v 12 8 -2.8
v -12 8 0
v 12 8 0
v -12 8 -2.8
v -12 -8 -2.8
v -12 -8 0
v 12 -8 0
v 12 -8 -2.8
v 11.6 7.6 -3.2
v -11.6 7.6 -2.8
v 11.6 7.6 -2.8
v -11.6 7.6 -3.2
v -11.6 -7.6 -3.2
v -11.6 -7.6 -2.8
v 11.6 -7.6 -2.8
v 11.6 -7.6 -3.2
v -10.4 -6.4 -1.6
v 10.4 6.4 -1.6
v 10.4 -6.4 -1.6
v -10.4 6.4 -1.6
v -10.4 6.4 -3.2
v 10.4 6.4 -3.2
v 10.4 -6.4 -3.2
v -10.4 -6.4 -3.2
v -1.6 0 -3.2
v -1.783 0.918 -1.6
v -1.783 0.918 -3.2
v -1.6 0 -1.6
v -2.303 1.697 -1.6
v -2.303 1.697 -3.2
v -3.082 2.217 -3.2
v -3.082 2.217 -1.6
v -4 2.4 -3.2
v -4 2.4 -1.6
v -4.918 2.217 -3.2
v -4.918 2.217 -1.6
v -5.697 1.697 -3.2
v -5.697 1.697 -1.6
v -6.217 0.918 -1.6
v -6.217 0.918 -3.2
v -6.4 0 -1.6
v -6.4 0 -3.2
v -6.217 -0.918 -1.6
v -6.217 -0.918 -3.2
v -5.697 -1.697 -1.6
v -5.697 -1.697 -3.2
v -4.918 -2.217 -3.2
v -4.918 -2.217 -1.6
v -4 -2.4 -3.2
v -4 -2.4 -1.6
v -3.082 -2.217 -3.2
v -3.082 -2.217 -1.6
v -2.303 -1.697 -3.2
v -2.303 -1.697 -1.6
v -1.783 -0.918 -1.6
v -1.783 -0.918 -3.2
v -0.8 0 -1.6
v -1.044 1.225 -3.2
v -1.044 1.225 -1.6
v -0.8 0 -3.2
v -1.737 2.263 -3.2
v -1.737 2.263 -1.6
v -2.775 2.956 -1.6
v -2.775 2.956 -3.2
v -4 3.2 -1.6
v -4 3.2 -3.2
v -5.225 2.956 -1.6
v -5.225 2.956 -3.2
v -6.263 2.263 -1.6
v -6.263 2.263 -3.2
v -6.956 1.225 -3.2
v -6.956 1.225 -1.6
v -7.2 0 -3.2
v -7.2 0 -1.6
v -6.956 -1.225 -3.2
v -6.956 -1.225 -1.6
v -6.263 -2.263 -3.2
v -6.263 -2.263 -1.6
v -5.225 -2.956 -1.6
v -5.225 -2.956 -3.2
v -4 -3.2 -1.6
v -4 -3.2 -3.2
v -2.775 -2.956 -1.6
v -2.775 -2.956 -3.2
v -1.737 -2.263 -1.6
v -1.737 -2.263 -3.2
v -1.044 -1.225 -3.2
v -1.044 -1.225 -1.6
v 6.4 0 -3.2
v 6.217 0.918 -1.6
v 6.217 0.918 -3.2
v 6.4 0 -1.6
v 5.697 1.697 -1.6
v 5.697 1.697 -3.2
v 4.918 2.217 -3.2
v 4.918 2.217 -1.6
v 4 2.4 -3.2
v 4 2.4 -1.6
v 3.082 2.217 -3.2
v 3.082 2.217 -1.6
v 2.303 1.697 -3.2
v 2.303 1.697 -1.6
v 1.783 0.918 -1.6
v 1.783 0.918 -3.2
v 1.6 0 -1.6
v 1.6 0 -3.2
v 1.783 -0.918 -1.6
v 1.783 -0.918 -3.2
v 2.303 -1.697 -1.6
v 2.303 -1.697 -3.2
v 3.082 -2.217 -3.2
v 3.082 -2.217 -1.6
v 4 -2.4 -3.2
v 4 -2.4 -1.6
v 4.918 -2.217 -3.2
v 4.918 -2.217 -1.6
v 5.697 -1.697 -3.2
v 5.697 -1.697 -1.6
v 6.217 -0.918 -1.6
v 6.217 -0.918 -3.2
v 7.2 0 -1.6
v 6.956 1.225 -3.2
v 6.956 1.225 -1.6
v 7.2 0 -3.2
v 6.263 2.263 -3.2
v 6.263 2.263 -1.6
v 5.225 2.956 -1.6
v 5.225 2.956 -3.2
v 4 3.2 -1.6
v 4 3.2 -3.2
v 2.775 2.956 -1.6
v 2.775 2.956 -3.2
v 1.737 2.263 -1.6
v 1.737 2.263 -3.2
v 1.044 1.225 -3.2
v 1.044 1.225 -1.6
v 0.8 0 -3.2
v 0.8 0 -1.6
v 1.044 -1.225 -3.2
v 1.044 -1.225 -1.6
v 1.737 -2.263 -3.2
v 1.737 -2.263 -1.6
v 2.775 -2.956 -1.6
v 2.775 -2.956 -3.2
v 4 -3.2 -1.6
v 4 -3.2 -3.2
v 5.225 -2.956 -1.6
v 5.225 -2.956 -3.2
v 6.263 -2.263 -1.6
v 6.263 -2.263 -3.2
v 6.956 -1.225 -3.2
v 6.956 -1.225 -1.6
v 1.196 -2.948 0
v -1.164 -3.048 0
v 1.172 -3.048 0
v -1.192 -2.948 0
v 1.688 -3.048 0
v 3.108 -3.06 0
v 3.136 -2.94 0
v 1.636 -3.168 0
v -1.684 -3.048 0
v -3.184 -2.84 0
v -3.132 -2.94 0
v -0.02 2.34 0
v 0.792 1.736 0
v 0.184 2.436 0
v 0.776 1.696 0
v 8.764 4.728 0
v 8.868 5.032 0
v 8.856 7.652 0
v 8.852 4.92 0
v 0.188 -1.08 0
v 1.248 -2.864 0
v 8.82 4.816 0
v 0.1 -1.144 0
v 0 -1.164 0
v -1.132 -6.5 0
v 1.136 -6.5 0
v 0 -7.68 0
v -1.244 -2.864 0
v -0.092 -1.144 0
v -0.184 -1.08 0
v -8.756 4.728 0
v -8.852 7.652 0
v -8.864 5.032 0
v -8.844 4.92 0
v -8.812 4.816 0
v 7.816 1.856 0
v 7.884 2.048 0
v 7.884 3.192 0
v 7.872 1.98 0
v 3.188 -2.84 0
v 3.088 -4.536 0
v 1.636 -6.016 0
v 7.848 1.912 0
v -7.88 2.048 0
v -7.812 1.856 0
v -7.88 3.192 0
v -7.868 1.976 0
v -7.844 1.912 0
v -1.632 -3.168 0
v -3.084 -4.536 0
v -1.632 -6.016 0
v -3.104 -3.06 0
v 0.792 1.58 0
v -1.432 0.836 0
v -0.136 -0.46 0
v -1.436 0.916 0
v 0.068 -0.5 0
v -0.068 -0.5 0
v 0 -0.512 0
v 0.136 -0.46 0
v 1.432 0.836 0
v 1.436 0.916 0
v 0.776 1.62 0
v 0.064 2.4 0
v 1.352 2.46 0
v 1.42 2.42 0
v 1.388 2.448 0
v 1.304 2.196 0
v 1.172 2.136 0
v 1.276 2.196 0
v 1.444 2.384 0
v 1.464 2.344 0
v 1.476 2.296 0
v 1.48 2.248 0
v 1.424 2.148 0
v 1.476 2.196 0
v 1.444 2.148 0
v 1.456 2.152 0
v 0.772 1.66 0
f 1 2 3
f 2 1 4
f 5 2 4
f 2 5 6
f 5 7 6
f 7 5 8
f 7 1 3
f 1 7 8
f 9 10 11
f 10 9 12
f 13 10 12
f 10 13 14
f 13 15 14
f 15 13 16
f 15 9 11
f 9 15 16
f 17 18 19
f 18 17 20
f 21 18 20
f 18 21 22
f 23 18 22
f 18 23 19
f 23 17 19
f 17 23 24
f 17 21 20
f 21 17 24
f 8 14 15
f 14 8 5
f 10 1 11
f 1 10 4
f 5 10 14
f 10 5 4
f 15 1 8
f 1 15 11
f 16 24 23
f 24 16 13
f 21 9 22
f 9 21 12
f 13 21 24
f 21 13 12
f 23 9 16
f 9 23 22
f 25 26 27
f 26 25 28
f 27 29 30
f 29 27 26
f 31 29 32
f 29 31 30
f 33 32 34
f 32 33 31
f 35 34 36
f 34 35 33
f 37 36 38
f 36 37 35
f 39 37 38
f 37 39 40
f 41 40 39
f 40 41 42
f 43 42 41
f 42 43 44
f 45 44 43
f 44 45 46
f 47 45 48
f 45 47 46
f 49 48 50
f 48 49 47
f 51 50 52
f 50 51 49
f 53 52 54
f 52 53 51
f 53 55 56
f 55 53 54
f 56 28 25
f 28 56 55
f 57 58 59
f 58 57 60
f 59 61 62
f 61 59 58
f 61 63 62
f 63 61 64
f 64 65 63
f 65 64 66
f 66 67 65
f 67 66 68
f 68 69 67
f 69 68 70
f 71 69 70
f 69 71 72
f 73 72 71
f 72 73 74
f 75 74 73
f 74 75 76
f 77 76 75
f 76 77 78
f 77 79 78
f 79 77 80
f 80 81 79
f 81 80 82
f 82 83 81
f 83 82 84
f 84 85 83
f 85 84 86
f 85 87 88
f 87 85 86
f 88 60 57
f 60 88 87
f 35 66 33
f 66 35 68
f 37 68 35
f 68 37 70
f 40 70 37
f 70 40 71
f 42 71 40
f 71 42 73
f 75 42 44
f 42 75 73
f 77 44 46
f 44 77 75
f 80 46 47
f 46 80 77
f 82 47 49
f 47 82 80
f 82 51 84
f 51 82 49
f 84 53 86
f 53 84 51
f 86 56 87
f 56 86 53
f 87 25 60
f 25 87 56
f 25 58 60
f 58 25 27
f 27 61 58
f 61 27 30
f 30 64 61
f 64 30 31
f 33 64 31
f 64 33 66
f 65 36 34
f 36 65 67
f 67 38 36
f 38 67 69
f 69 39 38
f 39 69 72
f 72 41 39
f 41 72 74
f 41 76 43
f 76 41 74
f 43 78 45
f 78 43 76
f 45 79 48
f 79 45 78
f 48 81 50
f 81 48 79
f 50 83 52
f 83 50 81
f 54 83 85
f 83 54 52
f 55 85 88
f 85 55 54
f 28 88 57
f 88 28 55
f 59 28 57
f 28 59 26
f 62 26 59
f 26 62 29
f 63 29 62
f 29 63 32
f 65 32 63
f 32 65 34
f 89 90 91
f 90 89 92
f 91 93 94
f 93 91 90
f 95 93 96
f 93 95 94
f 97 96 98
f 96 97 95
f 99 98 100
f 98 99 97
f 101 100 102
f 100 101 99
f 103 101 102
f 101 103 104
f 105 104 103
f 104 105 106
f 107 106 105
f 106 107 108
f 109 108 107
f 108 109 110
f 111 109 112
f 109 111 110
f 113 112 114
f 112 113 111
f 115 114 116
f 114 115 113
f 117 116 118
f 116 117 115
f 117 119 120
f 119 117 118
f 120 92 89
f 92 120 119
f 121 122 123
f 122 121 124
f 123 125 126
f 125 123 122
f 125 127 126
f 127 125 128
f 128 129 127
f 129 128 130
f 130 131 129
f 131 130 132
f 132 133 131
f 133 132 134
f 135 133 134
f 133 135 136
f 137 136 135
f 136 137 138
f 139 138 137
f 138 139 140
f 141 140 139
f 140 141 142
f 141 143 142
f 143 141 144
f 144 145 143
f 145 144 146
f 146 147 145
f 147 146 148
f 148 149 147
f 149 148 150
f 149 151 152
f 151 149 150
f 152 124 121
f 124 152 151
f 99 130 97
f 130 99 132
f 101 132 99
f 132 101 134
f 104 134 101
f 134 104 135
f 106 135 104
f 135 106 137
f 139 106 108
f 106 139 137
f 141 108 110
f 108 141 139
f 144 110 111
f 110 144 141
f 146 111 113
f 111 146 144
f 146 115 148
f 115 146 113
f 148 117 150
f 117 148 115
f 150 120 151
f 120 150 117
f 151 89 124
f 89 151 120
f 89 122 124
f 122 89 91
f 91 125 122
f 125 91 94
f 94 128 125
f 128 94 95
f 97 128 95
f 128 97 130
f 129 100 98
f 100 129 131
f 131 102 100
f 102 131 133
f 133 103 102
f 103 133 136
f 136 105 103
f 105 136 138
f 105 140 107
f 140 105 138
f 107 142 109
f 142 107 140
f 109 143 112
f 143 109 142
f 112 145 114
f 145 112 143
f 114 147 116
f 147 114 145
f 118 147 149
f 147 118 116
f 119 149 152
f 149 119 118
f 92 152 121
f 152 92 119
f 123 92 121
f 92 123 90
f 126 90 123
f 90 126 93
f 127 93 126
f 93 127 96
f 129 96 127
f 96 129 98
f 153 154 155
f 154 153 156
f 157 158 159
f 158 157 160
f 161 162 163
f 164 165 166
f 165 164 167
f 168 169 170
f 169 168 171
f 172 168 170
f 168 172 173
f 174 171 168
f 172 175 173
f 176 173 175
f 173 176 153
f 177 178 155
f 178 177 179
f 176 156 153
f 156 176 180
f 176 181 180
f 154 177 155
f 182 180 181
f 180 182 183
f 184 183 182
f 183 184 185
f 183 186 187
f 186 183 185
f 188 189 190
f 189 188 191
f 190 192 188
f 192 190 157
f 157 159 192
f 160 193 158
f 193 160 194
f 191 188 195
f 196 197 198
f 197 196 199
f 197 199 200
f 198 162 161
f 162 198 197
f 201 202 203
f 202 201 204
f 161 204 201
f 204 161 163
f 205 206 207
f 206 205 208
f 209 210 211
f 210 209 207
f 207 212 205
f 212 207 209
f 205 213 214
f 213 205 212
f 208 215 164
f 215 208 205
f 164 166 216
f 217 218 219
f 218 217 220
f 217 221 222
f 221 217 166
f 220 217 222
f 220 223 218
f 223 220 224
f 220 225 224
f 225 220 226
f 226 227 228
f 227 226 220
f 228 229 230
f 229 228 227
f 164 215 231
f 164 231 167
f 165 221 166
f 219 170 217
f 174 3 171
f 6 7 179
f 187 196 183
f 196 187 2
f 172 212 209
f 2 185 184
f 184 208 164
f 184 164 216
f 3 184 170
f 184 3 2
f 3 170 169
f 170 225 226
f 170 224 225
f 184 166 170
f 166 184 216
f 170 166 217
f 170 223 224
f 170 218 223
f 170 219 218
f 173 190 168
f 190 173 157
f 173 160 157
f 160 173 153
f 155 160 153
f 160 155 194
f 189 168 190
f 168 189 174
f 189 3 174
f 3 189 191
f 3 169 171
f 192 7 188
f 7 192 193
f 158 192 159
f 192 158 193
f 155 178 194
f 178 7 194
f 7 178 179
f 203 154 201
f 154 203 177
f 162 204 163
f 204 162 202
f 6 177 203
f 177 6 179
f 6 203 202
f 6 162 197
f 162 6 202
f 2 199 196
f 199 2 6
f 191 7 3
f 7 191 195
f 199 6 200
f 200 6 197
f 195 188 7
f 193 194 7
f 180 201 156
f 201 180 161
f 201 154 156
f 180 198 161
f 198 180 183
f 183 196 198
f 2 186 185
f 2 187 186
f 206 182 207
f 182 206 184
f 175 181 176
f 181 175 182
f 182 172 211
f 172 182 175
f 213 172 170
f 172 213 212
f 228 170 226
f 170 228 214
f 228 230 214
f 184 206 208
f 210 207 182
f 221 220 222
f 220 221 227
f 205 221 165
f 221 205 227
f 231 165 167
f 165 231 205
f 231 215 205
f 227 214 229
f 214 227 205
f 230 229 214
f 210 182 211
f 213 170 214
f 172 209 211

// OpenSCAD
// file: ../p/4-4ring3.scad
use <../lib.scad>
$fa=1; $fs=0.2;
function ldraw_lib__4_4ring3(realsolid=false) = [
// 0 Ring  3 x 1.0
// 0 Name: 4-4ring3.dat
// 0 Author: James Jessiman
// 0 !LDRAW_ORG Primitive UPDATE 2009-01
// 0 !LICENSE Licensed under CC BY 2.0 and CC BY 4.0 : see CAreadme.txt
// 
// 0 BFC CERTIFY CCW
  [0,"BFC","CERTIFY"],
  [0,"BFC","CCW"],
// 
// 0 !HISTORY 1998-12-15 [PTadmin] Official Update 1998-10
// 0 !HISTORY 2002-04-05 [hafhead] Added BFC statement
// 0 !HISTORY 2002-04-25 [PTadmin] Official Update 2002-02
// 0 !HISTORY 2007-06-24 [PTadmin] Header formatted for Contributor Agreement
// 0 !HISTORY 2008-07-01 [PTadmin] Official Update 2008-01
// 0 !HISTORY 2008-08-26 [cwdee] Switch polygon winding and rename
// 0 !HISTORY 2009-05-02 [PTadmin] Official Update 2009-01
// 
// 
// 4 16 -1.5308 0 3.6956 -1.1481 0 2.7717 0 0 3 0 0 4
  [4,16,-1.5308,0,3.6956,-1.1481,0,2.7717,0,0,3,0,0,4],
// 4 16 -2.8284 0 2.8284 -2.1213 0 2.1213 -1.1481 0 2.7717 -1.5308 0 3.6956
  [4,16,-2.8284,0,2.8284,-2.1213,0,2.1213,-1.1481,0,2.7717,-1.5308,0,3.6956],
// 4 16 -3.6956 0 1.5308 -2.7717 0 1.1481 -2.1213 0 2.1213 -2.8284 0 2.8284
  [4,16,-3.6956,0,1.5308,-2.7717,0,1.1481,-2.1213,0,2.1213,-2.8284,0,2.8284],
// 4 16 -4 0 0 -3 0 0 -2.7717 0 1.1481 -3.6956 0 1.5308
  [4,16,-4,0,0,-3,0,0,-2.7717,0,1.1481,-3.6956,0,1.5308],
// 4 16 -3.6956 0 -1.5308 -2.7717 0 -1.1481 -3 0 0 -4 0 0
  [4,16,-3.6956,0,-1.5308,-2.7717,0,-1.1481,-3,0,0,-4,0,0],
// 4 16 -2.8284 0 -2.8284 -2.1213 0 -2.1213 -2.7717 0 -1.1481 -3.6956 0 -1.5308
  [4,16,-2.8284,0,-2.8284,-2.1213,0,-2.1213,-2.7717,0,-1.1481,-3.6956,0,-1.5308],
// 4 16 -1.5308 0 -3.6956 -1.1481 0 -2.7717 -2.1213 0 -2.1213 -2.8284 0 -2.8284
  [4,16,-1.5308,0,-3.6956,-1.1481,0,-2.7717,-2.1213,0,-2.1213,-2.8284,0,-2.8284],
// 4 16 0 0 -4 0 0 -3 -1.1481 0 -2.7717 -1.5308 0 -3.6956
  [4,16,0,0,-4,0,0,-3,-1.1481,0,-2.7717,-1.5308,0,-3.6956],
// 4 16 1.5308 0 -3.6956 1.1481 0 -2.7717 0 0 -3 0 0 -4
  [4,16,1.5308,0,-3.6956,1.1481,0,-2.7717,0,0,-3,0,0,-4],
// 4 16 2.8284 0 -2.8284 2.1213 0 -2.1213 1.1481 0 -2.7717 1.5308 0 -3.6956
  [4,16,2.8284,0,-2.8284,2.1213,0,-2.1213,1.1481,0,-2.7717,1.5308,0,-3.6956],
// 4 16 3.6956 0 -1.5308 2.7717 0 -1.1481 2.1213 0 -2.1213 2.8284 0 -2.8284
  [4,16,3.6956,0,-1.5308,2.7717,0,-1.1481,2.1213,0,-2.1213,2.8284,0,-2.8284],
// 4 16 4 0 0 3 0 0 2.7717 0 -1.1481 3.6956 0 -1.5308
  [4,16,4,0,0,3,0,0,2.7717,0,-1.1481,3.6956,0,-1.5308],
// 4 16 3.6956 0 1.5308 2.7717 0 1.1481 3 0 0 4 0 0
  [4,16,3.6956,0,1.5308,2.7717,0,1.1481,3,0,0,4,0,0],
// 4 16 2.8284 0 2.8284 2.1213 0 2.1213 2.7717 0 1.1481 3.6956 0 1.5308
  [4,16,2.8284,0,2.8284,2.1213,0,2.1213,2.7717,0,1.1481,3.6956,0,1.5308],
// 4 16 1.5308 0 3.6956 1.1481 0 2.7717 2.1213 0 2.1213 2.8284 0 2.8284
  [4,16,1.5308,0,3.6956,1.1481,0,2.7717,2.1213,0,2.1213,2.8284,0,2.8284],
// 4 16 0 0 4 0 0 3 1.1481 0 2.7717 1.5308 0 3.6956
  [4,16,0,0,4,0,0,3,1.1481,0,2.7717,1.5308,0,3.6956],
// 0
];
module ldraw_lib__4_4ring3(step=0, col=false, unit=2/5, alt=false, line=0.2, solid=!$preview)
    makepoly(ldraw_lib__4_4ring3(solid), step=step, col=col, unit=unit, alt=alt, line=line, solid=solid);
ldraw_lib__4_4ring3(line=0.2);
// file: ../p/4-4edge.scad
use <../lib.scad>
function ldraw_lib__4_4edge() = [
// 0 Circle 1.0
// 0 Name: 4-4edge.dat
// 0 Author: James Jessiman
// 0 !LDRAW_ORG Primitive UPDATE 2017-01
// 0 !LICENSE Licensed under CC BY 2.0 and CC BY 4.0 : see CAreadme.txt
// 
// 0 BFC CERTIFY CCW
  [0,"BFC","CERTIFY"],
  [0,"BFC","CCW"],
// 
// 0 !HISTORY 1998-12-15 [PTadmin] Official Update 1998-10
// 0 !HISTORY 2005-12-28 [PTadmin] Official Update 2005-01
// 0 !HISTORY 2007-06-24 [PTadmin] Header formatted for Contributor Agreement
// 0 !HISTORY 2008-07-01 [PTadmin] Official Update 2008-01
// 0 !HISTORY 2017-01-15 [Steffen] BFCed
// 0 !HISTORY 2017-12-30 [PTadmin] Official Update 2017-01
// 
// 
// 2 24 1 0 0 0.9239 0 0.3827
  [2,24,1,0,0,0.9239,0,0.3827],
// 2 24 0.9239 0 0.3827 0.7071 0 0.7071
  [2,24,0.9239,0,0.3827,0.7071,0,0.7071],
// 2 24 0.7071 0 0.7071 0.3827 0 0.9239
  [2,24,0.7071,0,0.7071,0.3827,0,0.9239],
// 2 24 0.3827 0 0.9239 0 0 1
  [2,24,0.3827,0,0.9239,0,0,1],
// 2 24 0 0 1 -0.3827 0 0.9239
  [2,24,0,0,1,-0.3827,0,0.9239],
// 2 24 -0.3827 0 0.9239 -0.7071 0 0.7071
  [2,24,-0.3827,0,0.9239,-0.7071,0,0.7071],
// 2 24 -0.7071 0 0.7071 -0.9239 0 0.3827
  [2,24,-0.7071,0,0.7071,-0.9239,0,0.3827],
// 2 24 -0.9239 0 0.3827 -1 0 -0
  [2,24,-0.9239,0,0.3827,-1,0,-0],
// 2 24 -1 0 -0 -0.9239 0 -0.3827
  [2,24,-1,0,-0,-0.9239,0,-0.3827],
// 2 24 -0.9239 0 -0.3827 -0.7071 0 -0.7071
  [2,24,-0.9239,0,-0.3827,-0.7071,0,-0.7071],
// 2 24 -0.7071 0 -0.7071 -0.3827 0 -0.9239
  [2,24,-0.7071,0,-0.7071,-0.3827,0,-0.9239],
// 2 24 -0.3827 0 -0.9239 0 0 -1
  [2,24,-0.3827,0,-0.9239,0,0,-1],
// 2 24 0 0 -1 0.3827 0 -0.9239
  [2,24,0,0,-1,0.3827,0,-0.9239],
// 2 24 0.3827 0 -0.9239 0.7071 0 -0.7071
  [2,24,0.3827,0,-0.9239,0.7071,0,-0.7071],
// 2 24 0.7071 0 -0.7071 0.9239 0 -0.3827
  [2,24,0.7071,0,-0.7071,0.9239,0,-0.3827],
// 2 24 0.9239 0 -0.3827 1 0 0
  [2,24,0.9239,0,-0.3827,1,0,0],
];
module ldraw_lib__4_4edge(step=0, col=false, unit=2/5, alt=false, line=0.2, solid=!$preview)
    makepoly(ldraw_lib__4_4edge(), step=step, col=col, unit=unit, alt=alt, line=line, solid=solid);
ldraw_lib__4_4edge(line=0.2);
// file: ../p/4-4cyli.scad
use <../lib.scad>
$fa=1; $fs=0.2;
function ldraw_lib__4_4cyli(realsolid=false) = [
// 0 Cylinder 1.0
// 0 Name: 4-4cyli.dat
// 0 Author: James Jessiman
// 0 !LDRAW_ORG Primitive UPDATE 2005-01
// 0 !LICENSE Licensed under CC BY 2.0 and CC BY 4.0 : see CAreadme.txt
// 
// 0 BFC CERTIFY CCW
  [0,"BFC","CERTIFY"],
  [0,"BFC","CCW"],
// 
// 0 !HISTORY 1998-12-15 [PTadmin] Official Update 1998-10
// 0 !HISTORY 2002-03-23 [sbliss] Added BFC statement; merged headers from files in distributions LDraw 0.27 and Complete.
// 0 !HISTORY 2002-04-25 [PTadmin] Official Update 2002-02
// 0 !HISTORY 2004-12-14 [guyvivan] BFC CCW
// 0 !HISTORY 2005-12-28 [PTadmin] Official Update 2005-01
// 0 !HISTORY 2007-06-24 [PTadmin] Header formatted for Contributor Agreement
// 0 !HISTORY 2008-07-01 [PTadmin] Official Update 2008-01
// 
// 
// 4 16 1 1 0 0.9239 1 0.3827 0.9239 0 0.3827 1 0 0
  [4,16,1,1,0,0.9239,1,0.3827,0.9239,0,0.3827,1,0,0],
// 5 24 1 0 0 1 1 0 0.9239 0 0.3827 0.9239 0 -0.3827
  [5,24,1,0,0,1,1,0,0.9239,0,0.3827,0.9239,0,-0.3827],
// 4 16 0.9239 1 0.3827 0.7071 1 0.7071 0.7071 0 0.7071 0.9239 0 0.3827
  [4,16,0.9239,1,0.3827,0.7071,1,0.7071,0.7071,0,0.7071,0.9239,0,0.3827],
// 5 24 0.9239 0 0.3827 0.9239 1 0.3827 0.7071 0 0.7071 1 0 0
  [5,24,0.9239,0,0.3827,0.9239,1,0.3827,0.7071,0,0.7071,1,0,0],
// 4 16 0.7071 1 0.7071 0.3827 1 0.9239 0.3827 0 0.9239 0.7071 0 0.7071
  [4,16,0.7071,1,0.7071,0.3827,1,0.9239,0.3827,0,0.9239,0.7071,0,0.7071],
// 5 24 0.7071 0 0.7071 0.7071 1 0.7071 0.3827 0 0.9239 0.9239 0 0.3827
  [5,24,0.7071,0,0.7071,0.7071,1,0.7071,0.3827,0,0.9239,0.9239,0,0.3827],
// 4 16 0.3827 1 0.9239 0 1 1 0 0 1 0.3827 0 0.9239
  [4,16,0.3827,1,0.9239,0,1,1,0,0,1,0.3827,0,0.9239],
// 5 24 0.3827 0 0.9239 0.3827 1 0.9239 0 0 1 0.7071 0 0.7071
  [5,24,0.3827,0,0.9239,0.3827,1,0.9239,0,0,1,0.7071,0,0.7071],
// 4 16 0 1 1 -0.3827 1 0.9239 -0.3827 0 0.9239 0 0 1
  [4,16,0,1,1,-0.3827,1,0.9239,-0.3827,0,0.9239,0,0,1],
// 5 24 0 0 1 0 1 1 -0.3827 0 0.9239 0.3827 0 0.9239
  [5,24,0,0,1,0,1,1,-0.3827,0,0.9239,0.3827,0,0.9239],
// 4 16 -0.3827 1 0.9239 -0.7071 1 0.7071 -0.7071 0 0.7071 -0.3827 0 0.9239
  [4,16,-0.3827,1,0.9239,-0.7071,1,0.7071,-0.7071,0,0.7071,-0.3827,0,0.9239],
// 5 24 -0.3827 0 0.9239 -0.3827 1 0.9239 -0.7071 0 0.7071 0 0 1
  [5,24,-0.3827,0,0.9239,-0.3827,1,0.9239,-0.7071,0,0.7071,0,0,1],
// 4 16 -0.7071 1 0.7071 -0.9239 1 0.3827 -0.9239 0 0.3827 -0.7071 0 0.7071
  [4,16,-0.7071,1,0.7071,-0.9239,1,0.3827,-0.9239,0,0.3827,-0.7071,0,0.7071],
// 5 24 -0.7071 0 0.7071 -0.7071 1 0.7071 -0.9239 0 0.3827 -0.3827 0 0.9239
  [5,24,-0.7071,0,0.7071,-0.7071,1,0.7071,-0.9239,0,0.3827,-0.3827,0,0.9239],
// 4 16 -0.9239 1 0.3827 -1 1 0 -1 0 0 -0.9239 0 0.3827
  [4,16,-0.9239,1,0.3827,-1,1,0,-1,0,0,-0.9239,0,0.3827],
// 5 24 -0.9239 0 0.3827 -0.9239 1 0.3827 -1 0 0 -0.7071 0 0.7071
  [5,24,-0.9239,0,0.3827,-0.9239,1,0.3827,-1,0,0,-0.7071,0,0.7071],
// 4 16 -1 1 0 -0.9239 1 -0.3827 -0.9239 0 -0.3827 -1 0 0
  [4,16,-1,1,0,-0.9239,1,-0.3827,-0.9239,0,-0.3827,-1,0,0],
// 5 24 -1 0 0 -1 1 0 -0.9239 0 -0.3827 -0.9239 0 0.3827
  [5,24,-1,0,0,-1,1,0,-0.9239,0,-0.3827,-0.9239,0,0.3827],
// 4 16 -0.9239 1 -0.3827 -0.7071 1 -0.7071 -0.7071 0 -0.7071 -0.9239 0 -0.3827
  [4,16,-0.9239,1,-0.3827,-0.7071,1,-0.7071,-0.7071,0,-0.7071,-0.9239,0,-0.3827],
// 5 24 -0.9239 0 -0.3827 -0.9239 1 -0.3827 -0.7071 0 -0.7071 -1 0 0
  [5,24,-0.9239,0,-0.3827,-0.9239,1,-0.3827,-0.7071,0,-0.7071,-1,0,0],
// 4 16 -0.7071 1 -0.7071 -0.3827 1 -0.9239 -0.3827 0 -0.9239 -0.7071 0 -0.7071
  [4,16,-0.7071,1,-0.7071,-0.3827,1,-0.9239,-0.3827,0,-0.9239,-0.7071,0,-0.7071],
// 5 24 -0.7071 0 -0.7071 -0.7071 1 -0.7071 -0.3827 0 -0.9239 -0.9239 0 -0.3827
  [5,24,-0.7071,0,-0.7071,-0.7071,1,-0.7071,-0.3827,0,-0.9239,-0.9239,0,-0.3827],
// 4 16 -0.3827 1 -0.9239 0 1 -1 0 0 -1 -0.3827 0 -0.9239
  [4,16,-0.3827,1,-0.9239,0,1,-1,0,0,-1,-0.3827,0,-0.9239],
// 5 24 -0.3827 0 -0.9239 -0.3827 1 -0.9239 0 0 -1 -0.7071 0 -0.7071
  [5,24,-0.3827,0,-0.9239,-0.3827,1,-0.9239,0,0,-1,-0.7071,0,-0.7071],
// 4 16 0 1 -1 0.3827 1 -0.9239 0.3827 0 -0.9239 0 0 -1
  [4,16,0,1,-1,0.3827,1,-0.9239,0.3827,0,-0.9239,0,0,-1],
// 5 24 0 0 -1 0 1 -1 0.3827 0 -0.9239 -0.3827 0 -0.9239
  [5,24,0,0,-1,0,1,-1,0.3827,0,-0.9239,-0.3827,0,-0.9239],
// 4 16 0.3827 1 -0.9239 0.7071 1 -0.7071 0.7071 0 -0.7071 0.3827 0 -0.9239
  [4,16,0.3827,1,-0.9239,0.7071,1,-0.7071,0.7071,0,-0.7071,0.3827,0,-0.9239],
// 5 24 0.3827 0 -0.9239 0.3827 1 -0.9239 0.7071 0 -0.7071 0 0 -1
  [5,24,0.3827,0,-0.9239,0.3827,1,-0.9239,0.7071,0,-0.7071,0,0,-1],
// 4 16 0.7071 1 -0.7071 0.9239 1 -0.3827 0.9239 0 -0.3827 0.7071 0 -0.7071
  [4,16,0.7071,1,-0.7071,0.9239,1,-0.3827,0.9239,0,-0.3827,0.7071,0,-0.7071],
// 5 24 0.7071 0 -0.7071 0.7071 1 -0.7071 0.9239 0 -0.3827 0.3827 0 -0.9239
  [5,24,0.7071,0,-0.7071,0.7071,1,-0.7071,0.9239,0,-0.3827,0.3827,0,-0.9239],
// 4 16 0.9239 1 -0.3827 1 1 0 1 0 0 0.9239 0 -0.3827
  [4,16,0.9239,1,-0.3827,1,1,0,1,0,0,0.9239,0,-0.3827],
// 5 24 0.9239 0 -0.3827 0.9239 1 -0.3827 1 0 0 0.7071 0 -0.7071
  [5,24,0.9239,0,-0.3827,0.9239,1,-0.3827,1,0,0,0.7071,0,-0.7071],
// 0
];
module ldraw_lib__4_4cyli(step=0, col=false, unit=2/5, alt=false, line=0.2, solid=!$preview)
    makepoly(ldraw_lib__4_4cyli(solid), step=step, col=col, unit=unit, alt=alt, line=line, solid=solid);
ldraw_lib__4_4cyli(line=0.2);
// file: ../p/stud4.scad
use <../lib.scad>
use <4-4cyli.scad>
use <4-4edge.scad>
use <4-4ring3.scad>
function ldraw_lib__stud4() = [
// 0 Stud Tube Open
// 0 Name: stud4.dat
// 0 Author: James Jessiman
// 0 !LDRAW_ORG Primitive UPDATE 2009-02
// 0 !LICENSE Licensed under CC BY 4.0 : see CAreadme.txt
// 
// 0 BFC CERTIFY CCW
  [0,"BFC","CERTIFY"],
  [0,"BFC","CCW"],
// 
// 0 !HISTORY 1999-07-05 [PTadmin] Official Update 1999-05
// 0 !HISTORY 2002-04-04 [sbliss] Modified for BFC compliance
// 0 !HISTORY 2002-04-25 [PTadmin] Official Update 2002-02
// 0 !HISTORY 2007-06-24 [PTadmin] Header formatted for Contributor Agreement
// 0 !HISTORY 2008-07-01 [PTadmin] Official Update 2008-01
// 0 !HISTORY 2009-06-21 [cwdee] Update ring references to 4-4ring
// 0 !HISTORY 2009-09-03 [PTadmin] Official Update 2009-02
// 
// 
// 1 16 0 -4 0 6 0 0 0 1 0 0 0 6 4-4edge.dat
  [1,16,0,-4,0,6,0,0,0,1,0,0,0,6, ldraw_lib__4_4edge()],
// 1 16 0 -4 0 8 0 0 0 1 0 0 0 8 4-4edge.dat
  [1,16,0,-4,0,8,0,0,0,1,0,0,0,8, ldraw_lib__4_4edge()],
// 1 16 0 0 0 6 0 0 0 1 0 0 0 6 4-4edge.dat
  [1,16,0,0,0,6,0,0,0,1,0,0,0,6, ldraw_lib__4_4edge()],
// 1 16 0 0 0 8 0 0 0 1 0 0 0 8 4-4edge.dat
  [1,16,0,0,0,8,0,0,0,1,0,0,0,8, ldraw_lib__4_4edge()],
// 0 BFC INVERTNEXT
  [0,"BFC","INVERTNEXT"],
// 1 16 0 -4 0 6 0 0 0 4 0 0 0 6 4-4cyli.dat
  [1,16,0,-4,0,6,0,0,0,4,0,0,0,6, ldraw_lib__4_4cyli()],
// 1 16 0 -4 0 8 0 0 0 4 0 0 0 8 4-4cyli.dat
  [1,16,0,-4,0,8,0,0,0,4,0,0,0,8, ldraw_lib__4_4cyli()],
// 1 16 0 -4 0 2 0 0 0 1 0 0 0 2 4-4ring3.dat
  [1,16,0,-4,0,2,0,0,0,1,0,0,0,2, ldraw_lib__4_4ring3()],
  [-1,16,0,0,0,2,0,0,0,-1,0,0,0,2, ldraw_lib__4_4ring3()],
// 0
];
module ldraw_lib__stud4(step=0, col=false, unit=2/5, alt=false, line=0.2, solid=!$preview)
    makepoly(ldraw_lib__stud4(), step=step, col=col, unit=unit, alt=alt, line=line, solid=solid);
ldraw_lib__stud4(line=0.2);
// file: ../p/stug4-1x2.scad
use <../lib.scad>
use <stud4.scad>
$fa=1; $fs=0.2;
function ldraw_lib__stug4_1x2(realsolid=false) = [
// 0 Stud Tube Open Group  1 x  2
// 0 Name: stug4-1x2.dat
// 0 Author: Steffen [Steffen]
// 0 !LDRAW_ORG Primitive UPDATE 2011-01
// 0 !LICENSE Licensed under CC BY 2.0 and CC BY 4.0 : see CAreadme.txt
// 
// 0 BFC CERTIFY CCW
  [0,"BFC","CERTIFY"],
  [0,"BFC","CCW"],
// 
// 0 !HISTORY 2011-07-25 [PTadmin] Official Update 2011-01
// 
// 
// 1 16 -10 0 0 1 0 0 0 1 0 0 0 1 stud4.dat
  [1,16,-10,0,0,1,0,0,0,1,0,0,0,1, ldraw_lib__stud4(realsolid)],
// 1 16 10 0 0 1 0 0 0 1 0 0 0 1 stud4.dat
  [1,16,10,0,0,1,0,0,0,1,0,0,0,1, ldraw_lib__stud4(realsolid)],
];
module ldraw_lib__stug4_1x2(step=0, col=false, unit=2/5, alt=false, line=0.2, solid=!$preview)
    makepoly(ldraw_lib__stug4_1x2(solid), step=step, col=col, unit=unit, alt=alt, line=line, solid=solid);
ldraw_lib__stug4_1x2(line=0.2);
// file: ../p/box5.scad
use <../lib.scad>
function ldraw_lib__box5() = [
// 0 Box with 5 Faces and All Edges
// 0 Name: box5.dat
// 0 Author: James Jessiman
// 0 !LDRAW_ORG Primitive UPDATE 2012-01
// 0 !LICENSE Licensed under CC BY 2.0 and CC BY 4.0 : see CAreadme.txt
// 
// 0 BFC CERTIFY CCW
  [0,"BFC","CERTIFY"],
  [0,"BFC","CCW"],
// 
// 0 !HISTORY 2002-04-03 [sbliss] Modified for BFC compliance
// 0 !HISTORY 2002-04-25 [PTadmin] Official Update 2002-02
// 0 !HISTORY 2007-06-24 [PTadmin] Header formatted for Contributor Agreement
// 0 !HISTORY 2008-07-01 [PTadmin] Official Update 2008-01
// 0 !HISTORY 2012-02-16 [Philo] Changed to CCW
// 0 !HISTORY 2012-03-30 [PTadmin] Official Update 2012-01
// 
// 
// 2 24 1 1 1 -1 1 1
  [2,24,1,1,1,-1,1,1],
// 2 24 -1 1 1 -1 1 -1
  [2,24,-1,1,1,-1,1,-1],
// 2 24 -1 1 -1 1 1 -1
  [2,24,-1,1,-1,1,1,-1],
// 2 24 1 1 -1 1 1 1
  [2,24,1,1,-1,1,1,1],
// 2 24 1 0 1 -1 0 1
  [2,24,1,0,1,-1,0,1],
// 2 24 -1 0 1 -1 0 -1
  [2,24,-1,0,1,-1,0,-1],
// 2 24 -1 0 -1 1 0 -1
  [2,24,-1,0,-1,1,0,-1],
// 2 24 1 0 -1 1 0 1
  [2,24,1,0,-1,1,0,1],
// 2 24 1 0 1 1 1 1
  [2,24,1,0,1,1,1,1],
// 2 24 -1 0 1 -1 1 1
  [2,24,-1,0,1,-1,1,1],
// 2 24 1 0 -1 1 1 -1
  [2,24,1,0,-1,1,1,-1],
// 2 24 -1 0 -1 -1 1 -1
  [2,24,-1,0,-1,-1,1,-1],
// 4 16 -1 1 1 1 1 1 1 1 -1 -1 1 -1
  [4,16,-1,1,1,1,1,1,1,1,-1,-1,1,-1],
// 4 16 -1 1 1 -1 0 1 1 0 1 1 1 1
  [4,16,-1,1,1,-1,0,1,1,0,1,1,1,1],
// 4 16 -1 1 -1 -1 0 -1 -1 0 1 -1 1 1
  [4,16,-1,1,-1,-1,0,-1,-1,0,1,-1,1,1],
// 4 16 1 1 -1 1 0 -1 -1 0 -1 -1 1 -1
  [4,16,1,1,-1,1,0,-1,-1,0,-1,-1,1,-1],
// 4 16 1 1 1 1 0 1 1 0 -1 1 1 -1
  [4,16,1,1,1,1,0,1,1,0,-1,1,1,-1],
];
makepoly(ldraw_lib__box5(), line=0.2);
// file: ../p/box4.scad
use <../lib.scad>
function ldraw_lib__box4() = [
// 0 Box with 4 Faces (2 Parallel Pairs) and All Edges
// 0 Name: box4.dat
// 0 Author: James Jessiman
// 0 !LDRAW_ORG Primitive UPDATE 2012-01
// 0 !LICENSE Licensed under CC BY 4.0 : see CAreadme.txt
// 
// 0 BFC CERTIFY CCW
  [0,"BFC","CERTIFY"],
  [0,"BFC","CCW"],
// 
// 0 !HISTORY 2002-04-03 [sbliss] Modified for BFC compliance
// 0 !HISTORY 2002-04-25 [PTadmin] Official Update 2002-02
// 0 !HISTORY 2007-06-24 [PTadmin] Header formatted for Contributor Agreement
// 0 !HISTORY 2008-07-01 [PTadmin] Official Update 2008-01
// 0 !HISTORY 2012-02-16 [Philo] Changed to CCW
// 0 !HISTORY 2012-03-30 [PTadmin] Official Update 2012-01
// 
// 
// 2 24 1 1 1 -1 1 1
  [2,24,1,1,1,-1,1,1],
// 2 24 -1 1 1 -1 1 -1
  [2,24,-1,1,1,-1,1,-1],
// 2 24 -1 1 -1 1 1 -1
  [2,24,-1,1,-1,1,1,-1],
// 2 24 1 1 -1 1 1 1
  [2,24,1,1,-1,1,1,1],
// 2 24 1 0 1 -1 0 1
  [2,24,1,0,1,-1,0,1],
// 2 24 -1 0 1 -1 0 -1
  [2,24,-1,0,1,-1,0,-1],
// 2 24 -1 0 -1 1 0 -1
  [2,24,-1,0,-1,1,0,-1],
// 2 24 1 0 -1 1 0 1
  [2,24,1,0,-1,1,0,1],
// 2 24 1 0 1 1 1 1
  [2,24,1,0,1,1,1,1],
// 2 24 -1 0 1 -1 1 1
  [2,24,-1,0,1,-1,1,1],
// 2 24 1 0 -1 1 1 -1
  [2,24,1,0,-1,1,1,-1],
// 2 24 -1 0 -1 -1 1 -1
  [2,24,-1,0,-1,-1,1,-1],
// 4 16 -1 1 1 -1 0 1 1 0 1 1 1 1
  [4,16,-1,1,1,-1,0,1,1,0,1,1,1,1],
// 4 16 -1 1 -1 -1 0 -1 -1 0 1 -1 1 1
  [4,16,-1,1,-1,-1,0,-1,-1,0,1,-1,1,1],
// 4 16 1 1 -1 1 0 -1 -1 0 -1 -1 1 -1
  [4,16,1,1,-1,1,0,-1,-1,0,-1,-1,1,-1],
// 4 16 1 1 1 1 0 1 1 0 -1 1 1 -1
  [4,16,1,1,1,1,0,1,1,0,-1,1,1,-1],
];
module ldraw_lib__box4(step=0, col=false, unit=2/5, alt=false, line=0.2, solid=!$preview)
    makepoly(ldraw_lib__box4(), step=step, col=col, unit=unit, alt=alt, line=line, solid=solid);
ldraw_lib__box4(line=0.2);
// file: s/26603s01.scad
use <../../lib.scad>
use <../../p/box4.scad>
use <../../p/box5.scad>
use <../../p/stug4-1x2.scad>
$fa=1; $fs=0.2;
function ldraw_lib__s__26603s01(realsolid=false) = [
// 0 ~Tile  2 x  3 without Top
// 0 Name: s\26603s01.dat
// 0 Author: Philippe Hurbain [Philo]
// 0 !LDRAW_ORG Subpart UPDATE 2016-01
// 0 !LICENSE Licensed under CC BY 2.0 and CC BY 4.0 : see CAreadme.txt
// 
// 0 BFC CERTIFY CCW
  [0,"BFC","CERTIFY"],
  [0,"BFC","CCW"],
// 
// 0 !HISTORY 2016-12-31 [PTadmin] Official Update 2016-01
// 
// 
// 1 16 0 0 0 30 0 0 0 7 0 0 0 20 box4.dat
  [1,16,0,0,0,30,0,0,0,7,0,0,0,20, ldraw_lib__box4(realsolid)],
// 1 16 0 7 0 29 0 0 0 1 0 0 0 19 box4.dat
  [1,16,0,7,0,29,0,0,0,1,0,0,0,19, ldraw_lib__box4(realsolid)],
// 0 BFC INVERTNEXT
  [0,"BFC","INVERTNEXT"],
// 1 16 0 8 0 -26 0 0 0 -4 0 0 0 16 box5.dat
  [1,16,0,8,0,-26,0,0,0,-4,0,0,0,16, ldraw_lib__box5(realsolid)],
// 4 16 -30 7 -20 -29 7 -19 29 7 -19 30 7 -20
  [4,16,-30,7,-20,-29,7,-19,29,7,-19,30,7,-20],
// 4 16 30 7 20 29 7 19 -29 7 19 -30 7 20
  [4,16,30,7,20,29,7,19,-29,7,19,-30,7,20],
// 4 16 -30 7 -20 -30 7 20 -29 7 19 -29 7 -19
  [4,16,-30,7,-20,-30,7,20,-29,7,19,-29,7,-19],
// 4 16 30 7 20 30 7 -20 29 7 -19 29 7 19
  [4,16,30,7,20,30,7,-20,29,7,-19,29,7,19],
// 4 16 -29 8 -19 -26 8 -16 26 8 -16 29 8 -19
  [4,16,-29,8,-19,-26,8,-16,26,8,-16,29,8,-19],
// 4 16 29 8 19 26 8 16 -26 8 16 -29 8 19
  [4,16,29,8,19,26,8,16,-26,8,16,-29,8,19],
// 4 16 -29 8 -19 -29 8 19 -26 8 16 -26 8 -16
  [4,16,-29,8,-19,-29,8,19,-26,8,16,-26,8,-16],
// 4 16 29 8 19 29 8 -19 26 8 -16 26 8 16
  [4,16,29,8,19,29,8,-19,26,8,-16,26,8,16],
// 1 16 0 4 0 1 0 0 0 -1 0 0 0 1 stug4-1x2.dat
  [1,16,0,4,0,1,0,0,0,-1,0,0,0,1, ldraw_lib__stug4_1x2(realsolid)],
];
module ldraw_lib__s__26603s01(step=0, col=false, unit=2/5, alt=false, line=0.2, solid=!$preview)
    makepoly(ldraw_lib__s__26603s01(solid), step=step, col=col, unit=unit, alt=alt, line=line, solid=solid);
ldraw_lib__s__26603s01(line=0.2);
// main file
use <../lib.scad>
use <s/26603s01.scad>
function ldraw_lib__26603p07() = [
// 0 Tile  2 x  3 with White House Atreides Hawk Crest Pattern
// 0 Name: 26603p07.dat
// 0 Author: Philippe Hurbain [Philo]
// 0 !LDRAW_ORG Part UPDATE 2024-09
// 0 !LICENSE Licensed under CC BY 4.0 : see CAreadme.txt
// 
// 0 BFC CERTIFY CCW
  [0,"BFC","CERTIFY"],
  [0,"BFC","CCW"],
// 
// 0 !KEYWORDS Bird, Bricklink 26603pb385, Brickowl 360289, Dune, emblem
// 0 !KEYWORDS Rebrickable 26603pr0130, Set 10327, symbol
// 
// 0 !HISTORY 2024-10-27 [OrionP] Official Update 2024-09
// 
// 1 16 0 0 0 1 0 0 0 1 0 0 0 1 s\26603s01.dat
  [1,16,0,0,0,1,0,0,0,1,0,0,0,1, ldraw_lib__s__26603s01()],
// 
// 0 // White
// 4 15 -2.98 0 -7.37 -2.91 0 -7.62 2.93 0 -7.62 2.99 0 -7.37
  [4,15,-2.98,0,-7.37,-2.91,0,-7.62,2.93,0,-7.62,2.99,0,-7.37],
// 4 15 7.77 0 -7.65 7.84 0 -7.35 4.22 0 -7.62 4.09 0 -7.92
  [4,15,7.77,0,-7.65,7.84,0,-7.35,4.22,0,-7.62,4.09,0,-7.92],
// 3 15 -4.21 0 -7.62 -7.96 0 -7.1 -7.83 0 -7.35
  [3,15,-4.21,0,-7.62,-7.96,0,-7.1,-7.83,0,-7.35],
// 4 15 1.94 0 4.24 1.98 0 4.34 0.46 0 6.09 -0.05 0 5.85
  [4,15,1.94,0,4.24,1.98,0,4.34,0.46,0,6.09,-0.05,0,5.85],
// 4 15 21.91 0 11.82 22.13 0 12.3 22.17 0 12.58 22.14 0 19.13
  [4,15,21.91,0,11.82,22.13,0,12.3,22.17,0,12.58,22.14,0,19.13],
// 4 15 21.91 0 11.82 22.14 0 19.13 0.47 0 -2.7 3.12 0 -7.16
  [4,15,21.91,0,11.82,22.14,0,19.13,0.47,0,-2.7,3.12,0,-7.16],
// 3 15 22.05 0 12.04 22.13 0 12.3 21.91 0 11.82
  [3,15,22.05,0,12.04,22.13,0,12.3,21.91,0,11.82],
// 3 15 0.47 0 -2.7 0.25 0 -2.86 3.12 0 -7.16
  [3,15,0.47,0,-2.7,0.25,0,-2.86,3.12,0,-7.16],
// 4 15 0 0 -2.91 2.99 0 -7.37 3.12 0 -7.16 0.25 0 -2.86
  [4,15,0,0,-2.91,2.99,0,-7.37,3.12,0,-7.16,0.25,0,-2.86],
// 4 15 -2.83 0 -16.25 0 0 -19.2 2.84 0 -16.25 2.93 0 -7.62
  [4,15,-2.83,0,-16.25,0,0,-19.2,2.84,0,-16.25,2.93,0,-7.62],
// 4 15 -2.98 0 -7.37 2.99 0 -7.37 0 0 -2.91 -3.11 0 -7.16
  [4,15,-2.98,0,-7.37,2.99,0,-7.37,0,0,-2.91,-3.11,0,-7.16],
// 3 15 0 0 -2.91 -0.23 0 -2.86 -3.11 0 -7.16
  [3,15,0,0,-2.91,-0.23,0,-2.86,-3.11,0,-7.16],
// 3 15 -2.91 0 -7.62 -2.83 0 -16.25 2.93 0 -7.62
  [3,15,-2.91,0,-7.62,-2.83,0,-16.25,2.93,0,-7.62],
// 4 15 -3.11 0 -7.16 -0.23 0 -2.86 -0.46 0 -2.7 -21.89 0 11.82
  [4,15,-3.11,0,-7.16,-0.23,0,-2.86,-0.46,0,-2.7,-21.89,0,11.82],
// 4 15 -21.89 0 11.82 -0.46 0 -2.7 -22.13 0 19.13 -22.16 0 12.58
  [4,15,-21.89,0,11.82,-0.46,0,-2.7,-22.13,0,19.13,-22.16,0,12.58],
// 4 15 -21.89 0 11.82 -22.16 0 12.58 -22.11 0 12.3 -22.03 0 12.04
  [4,15,-21.89,0,11.82,-22.16,0,12.58,-22.11,0,12.3,-22.03,0,12.04],
// 4 15 19.54 0 4.64 19.68 0 4.95 19.71 0 5.12 19.71 0 7.98
  [4,15,19.54,0,4.64,19.68,0,4.95,19.71,0,5.12,19.71,0,7.98],
// 4 15 19.71 0 7.98 4.22 0 -7.62 7.97 0 -7.1 19.54 0 4.64
  [4,15,19.71,0,7.98,4.22,0,-7.62,7.97,0,-7.1,19.54,0,4.64],
// 3 15 4.22 0 -7.62 7.84 0 -7.35 7.97 0 -7.1
  [3,15,4.22,0,-7.62,7.84,0,-7.35,7.97,0,-7.1],
// 4 15 4.09 0 -7.92 4.09 0 -15.04 7.72 0 -11.34 7.77 0 -7.65
  [4,15,4.09,0,-7.92,4.09,0,-15.04,7.72,0,-11.34,7.77,0,-7.65],
// 3 15 19.68 0 4.95 19.54 0 4.64 19.62 0 4.78
  [3,15,19.68,0,4.95,19.54,0,4.64,19.62,0,4.78],
// 4 15 -19.53 0 4.64 -19.7 0 7.98 -19.7 0 5.12 -19.67 0 4.94
  [4,15,-19.53,0,4.64,-19.7,0,7.98,-19.7,0,5.12,-19.67,0,4.94],
// 3 15 -19.53 0 4.64 -19.67 0 4.94 -19.61 0 4.78
  [3,15,-19.53,0,4.64,-19.67,0,4.94,-19.61,0,4.78],
// 4 15 -19.7 0 7.98 -19.53 0 4.64 -7.96 0 -7.1 -4.21 0 -7.62
  [4,15,-19.7,0,7.98,-19.53,0,4.64,-7.96,0,-7.1,-4.21,0,-7.62],
// 4 15 -7.71 0 -11.34 -4.08 0 -15.04 -4.08 0 -7.92 -7.76 0 -7.65
  [4,15,-7.71,0,-11.34,-4.08,0,-15.04,-4.08,0,-7.92,-7.76,0,-7.65],
// 4 15 -7.76 0 -7.65 -4.08 0 -7.92 -4.21 0 -7.62 -7.83 0 -7.35
  [4,15,-7.76,0,-7.65,-4.08,0,-7.92,-4.21,0,-7.62,-7.83,0,-7.35],
// 4 15 1.98 0 3.95 -3.59 0 2.29 -3.58 0 2.09 -0.34 0 -1.15
  [4,15,1.98,0,3.95,-3.59,0,2.29,-3.58,0,2.09,-0.34,0,-1.15],
// 4 15 0.17 0 -1.25 -0.34 0 -1.15 -0.17 0 -1.25 0 0 -1.28
  [4,15,0.17,0,-1.25,-0.34,0,-1.15,-0.17,0,-1.25,0,0,-1.28],
// 4 15 -0.34 0 -1.15 0.17 0 -1.25 0.34 0 -1.15 1.98 0 3.95
  [4,15,-0.34,0,-1.15,0.17,0,-1.25,0.34,0,-1.15,1.98,0,3.95],
// 4 15 1.98 0 3.95 0.34 0 -1.15 3.58 0 2.09 3.59 0 2.29
  [4,15,1.98,0,3.95,0.34,0,-1.15,3.58,0,2.09,3.59,0,2.29],
// 4 15 1.94 0 4.05 -0.05 0 5.85 -3.59 0 2.29 1.98 0 3.95
  [4,15,1.94,0,4.05,-0.05,0,5.85,-3.59,0,2.29,1.98,0,3.95],
// 3 15 -0.05 0 5.85 0.46 0 6.09 0.16 0 6
  [3,15,-0.05,0,5.85,0.46,0,6.09,0.16,0,6],
// 4 15 3.55 0 6.05 3.47 0 6.12 3.38 0 6.15 3.26 0 5.49
  [4,15,3.55,0,6.05,3.47,0,6.12,3.38,0,6.15,3.26,0,5.49],
// 4 15 3.38 0 6.15 0.46 0 6.09 2.93 0 5.34 3.19 0 5.49
  [4,15,3.38,0,6.15,0.46,0,6.09,2.93,0,5.34,3.19,0,5.49],
// 3 15 3.26 0 5.49 3.38 0 6.15 3.19 0 5.49
  [3,15,3.26,0,5.49,3.38,0,6.15,3.19,0,5.49],
// 4 15 3.61 0 5.96 3.55 0 6.05 3.26 0 5.49 3.66 0 5.86
  [4,15,3.61,0,5.96,3.55,0,6.05,3.26,0,5.49,3.66,0,5.86],
// 4 15 3.69 0 5.74 3.66 0 5.86 3.26 0 5.49 3.7 0 5.62
  [4,15,3.69,0,5.74,3.66,0,5.86,3.26,0,5.49,3.7,0,5.62],
// 4 15 3.69 0 5.49 3.7 0 5.62 3.26 0 5.49 3.56 0 5.37
  [4,15,3.69,0,5.49,3.7,0,5.62,3.26,0,5.49,3.56,0,5.37],
// 4 15 3.56 0 5.37 3.61 0 5.37 3.64 0 5.38 3.69 0 5.49
  [4,15,3.56,0,5.37,3.61,0,5.37,3.64,0,5.38,3.69,0,5.49],
// 3 15 -0.05 0 5.85 1.94 0 4.05 1.93 0 4.15
  [3,15,-0.05,0,5.85,1.94,0,4.05,1.93,0,4.15],
// 3 15 -0.05 0 5.85 1.93 0 4.15 1.94 0 4.24
  [3,15,-0.05,0,5.85,1.93,0,4.15,1.94,0,4.24],
// 3 15 1.98 0 4.34 2.93 0 5.34 0.46 0 6.09
  [3,15,1.98,0,4.34,2.93,0,5.34,0.46,0,6.09],
// 
// 0 // Main_Colour
// 3 16 3.47 0 6.12 22.14 0 19.13 3.38 0 6.15
  [3,16,3.47,0,6.12,22.14,0,19.13,3.38,0,6.15],
// 3 16 22.05 0 12.04 30 0 20 22.13 0 12.3
  [3,16,22.05,0,12.04,30,0,20,22.13,0,12.3],
// 3 16 -30 0 -20 30 0 -20 0 0 -19.2
  [3,16,-30,0,-20,30,0,-20,0,0,-19.2],
// 4 16 -19.7 0 5.12 -21.89 0 11.82 -22.03 0 12.04 -30 0 20
  [4,16,-19.7,0,5.12,-21.89,0,11.82,-22.03,0,12.04,-30,0,20],
// 3 16 0.47 0 -2.7 0.34 0 -1.15 0.17 0 -1.25
  [3,16,0.47,0,-2.7,0.34,0,-1.15,0.17,0,-1.25],
// 3 16 -30 0 20 -22.16 0 12.58 -22.13 0 19.13
  [3,16,-30,0,20,-22.16,0,12.58,-22.13,0,19.13],
// 3 16 -22.13 0 19.13 -3.59 0 2.29 -0.05 0 5.85
  [3,16,-22.13,0,19.13,-3.59,0,2.29,-0.05,0,5.85],
// 3 16 -22.13 0 19.13 -0.05 0 5.85 0.16 0 6
  [3,16,-22.13,0,19.13,-0.05,0,5.85,0.16,0,6],
// 4 16 30 0 20 -30 0 20 -22.13 0 19.13 22.14 0 19.13
  [4,16,30,0,20,-30,0,20,-22.13,0,19.13,22.14,0,19.13],
// 3 16 30 0 20 22.14 0 19.13 22.17 0 12.58
  [3,16,30,0,20,22.14,0,19.13,22.17,0,12.58],
// 3 16 22.14 0 19.13 3.69 0 5.74 3.7 0 5.62
  [3,16,22.14,0,19.13,3.69,0,5.74,3.7,0,5.62],
// 3 16 22.14 0 19.13 3.66 0 5.86 3.69 0 5.74
  [3,16,22.14,0,19.13,3.66,0,5.86,3.69,0,5.74],
// 4 16 -22.13 0 19.13 0.16 0 6 0.46 0 6.09 22.14 0 19.13
  [4,16,-22.13,0,19.13,0.16,0,6,0.46,0,6.09,22.14,0,19.13],
// 3 16 22.14 0 19.13 0.46 0 6.09 3.38 0 6.15
  [3,16,22.14,0,19.13,0.46,0,6.09,3.38,0,6.15],
// 3 16 22.14 0 19.13 3.61 0 5.96 3.66 0 5.86
  [3,16,22.14,0,19.13,3.61,0,5.96,3.66,0,5.86],
// 3 16 22.14 0 19.13 3.55 0 6.05 3.61 0 5.96
  [3,16,22.14,0,19.13,3.55,0,6.05,3.61,0,5.96],
// 3 16 22.14 0 19.13 3.47 0 6.12 3.55 0 6.05
  [3,16,22.14,0,19.13,3.47,0,6.12,3.55,0,6.05],
// 4 16 19.71 0 7.98 21.91 0 11.82 3.12 0 -7.16 4.22 0 -7.62
  [4,16,19.71,0,7.98,21.91,0,11.82,3.12,0,-7.16,4.22,0,-7.62],
// 4 16 3.12 0 -7.16 2.99 0 -7.37 4.09 0 -7.92 4.22 0 -7.62
  [4,16,3.12,0,-7.16,2.99,0,-7.37,4.09,0,-7.92,4.22,0,-7.62],
// 4 16 4.09 0 -7.92 2.99 0 -7.37 2.93 0 -7.62 4.09 0 -15.04
  [4,16,4.09,0,-7.92,2.99,0,-7.37,2.93,0,-7.62,4.09,0,-15.04],
// 4 16 21.91 0 11.82 19.71 0 7.98 19.71 0 5.12 22.05 0 12.04
  [4,16,21.91,0,11.82,19.71,0,7.98,19.71,0,5.12,22.05,0,12.04],
// 4 16 30 0 20 22.05 0 12.04 19.71 0 5.12 19.68 0 4.95
  [4,16,30,0,20,22.05,0,12.04,19.71,0,5.12,19.68,0,4.95],
// 3 16 30 0 20 22.17 0 12.58 22.13 0 12.3
  [3,16,30,0,20,22.17,0,12.58,22.13,0,12.3],
// 4 16 30 0 -20 19.54 0 4.64 7.97 0 -7.1 7.72 0 -11.34
  [4,16,30,0,-20,19.54,0,4.64,7.97,0,-7.1,7.72,0,-11.34],
// 4 16 7.97 0 -7.1 7.84 0 -7.35 7.77 0 -7.65 7.72 0 -11.34
  [4,16,7.97,0,-7.1,7.84,0,-7.35,7.77,0,-7.65,7.72,0,-11.34],
// 3 16 2.93 0 -7.62 2.84 0 -16.25 4.09 0 -15.04
  [3,16,2.93,0,-7.62,2.84,0,-16.25,4.09,0,-15.04],
// 4 16 30 0 -20 4.09 0 -15.04 2.84 0 -16.25 0 0 -19.2
  [4,16,30,0,-20,4.09,0,-15.04,2.84,0,-16.25,0,0,-19.2],
// 4 16 -4.08 0 -15.04 -2.83 0 -16.25 -2.91 0 -7.62 -4.08 0 -7.92
  [4,16,-4.08,0,-15.04,-2.83,0,-16.25,-2.91,0,-7.62,-4.08,0,-7.92],
// 4 16 -7.96 0 -7.1 -7.71 0 -11.34 -7.76 0 -7.65 -7.83 0 -7.35
  [4,16,-7.96,0,-7.1,-7.71,0,-11.34,-7.76,0,-7.65,-7.83,0,-7.35],
// 4 16 -30 0 -20 0 0 -19.2 -2.83 0 -16.25 -4.08 0 -15.04
  [4,16,-30,0,-20,0,0,-19.2,-2.83,0,-16.25,-4.08,0,-15.04],
// 3 16 -30 0 -20 -4.08 0 -15.04 -7.71 0 -11.34
  [3,16,-30,0,-20,-4.08,0,-15.04,-7.71,0,-11.34],
// 4 16 -30 0 -20 -7.71 0 -11.34 -7.96 0 -7.1 -19.53 0 4.64
  [4,16,-30,0,-20,-7.71,0,-11.34,-7.96,0,-7.1,-19.53,0,4.64],
// 4 16 -19.67 0 4.94 -19.7 0 5.12 -30 0 20 -30 0 -20
  [4,16,-19.67,0,4.94,-19.7,0,5.12,-30,0,20,-30,0,-20],
// 4 16 30 0 -20 30 0 20 19.68 0 4.95 19.62 0 4.78
  [4,16,30,0,-20,30,0,20,19.68,0,4.95,19.62,0,4.78],
// 3 16 -19.67 0 4.94 -30 0 -20 -19.61 0 4.78
  [3,16,-19.67,0,4.94,-30,0,-20,-19.61,0,4.78],
// 3 16 -19.61 0 4.78 -30 0 -20 -19.53 0 4.64
  [3,16,-19.61,0,4.78,-30,0,-20,-19.53,0,4.64],
// 3 16 19.62 0 4.78 19.54 0 4.64 30 0 -20
  [3,16,19.62,0,4.78,19.54,0,4.64,30,0,-20],
// 3 16 7.72 0 -11.34 4.09 0 -15.04 30 0 -20
  [3,16,7.72,0,-11.34,4.09,0,-15.04,30,0,-20],
// 4 16 -3.11 0 -7.16 -4.21 0 -7.62 -4.08 0 -7.92 -2.98 0 -7.37
  [4,16,-3.11,0,-7.16,-4.21,0,-7.62,-4.08,0,-7.92,-2.98,0,-7.37],
// 3 16 -4.08 0 -7.92 -2.91 0 -7.62 -2.98 0 -7.37
  [3,16,-4.08,0,-7.92,-2.91,0,-7.62,-2.98,0,-7.37],
// 4 16 -3.11 0 -7.16 -21.89 0 11.82 -19.7 0 7.98 -4.21 0 -7.62
  [4,16,-3.11,0,-7.16,-21.89,0,11.82,-19.7,0,7.98,-4.21,0,-7.62],
// 3 16 -21.89 0 11.82 -19.7 0 5.12 -19.7 0 7.98
  [3,16,-21.89,0,11.82,-19.7,0,5.12,-19.7,0,7.98],
// 3 16 -30 0 20 -22.11 0 12.3 -22.16 0 12.58
  [3,16,-30,0,20,-22.11,0,12.3,-22.16,0,12.58],
// 3 16 -30 0 20 -22.03 0 12.04 -22.11 0 12.3
  [3,16,-30,0,20,-22.03,0,12.04,-22.11,0,12.3],
// 4 16 -3.58 0 2.09 -22.13 0 19.13 -0.46 0 -2.7 -0.34 0 -1.15
  [4,16,-3.58,0,2.09,-22.13,0,19.13,-0.46,0,-2.7,-0.34,0,-1.15],
// 4 16 0.25 0 -2.86 -0.46 0 -2.7 -0.23 0 -2.86 0 0 -2.91
  [4,16,0.25,0,-2.86,-0.46,0,-2.7,-0.23,0,-2.86,0,0,-2.91],
// 4 16 -0.46 0 -2.7 0.25 0 -2.86 0.47 0 -2.7 0 0 -1.28
  [4,16,-0.46,0,-2.7,0.25,0,-2.86,0.47,0,-2.7,0,0,-1.28],
// 4 16 0.47 0 -2.7 22.14 0 19.13 3.58 0 2.09 0.34 0 -1.15
  [4,16,0.47,0,-2.7,22.14,0,19.13,3.58,0,2.09,0.34,0,-1.15],
// 4 16 3.59 0 2.29 22.14 0 19.13 3.7 0 5.62 3.69 0 5.49
  [4,16,3.59,0,2.29,22.14,0,19.13,3.7,0,5.62,3.69,0,5.49],
// 3 16 3.69 0 5.49 3.64 0 5.38 3.59 0 2.29
  [3,16,3.69,0,5.49,3.64,0,5.38,3.59,0,2.29],
// 3 16 -22.13 0 19.13 -3.58 0 2.09 -3.59 0 2.29
  [3,16,-22.13,0,19.13,-3.58,0,2.09,-3.59,0,2.29],
// 3 16 -0.17 0 -1.25 -0.34 0 -1.15 -0.46 0 -2.7
  [3,16,-0.17,0,-1.25,-0.34,0,-1.15,-0.46,0,-2.7],
// 4 16 2.93 0 5.34 3.56 0 5.37 3.26 0 5.49 3.19 0 5.49
  [4,16,2.93,0,5.34,3.56,0,5.37,3.26,0,5.49,3.19,0,5.49],
// 4 16 2.93 0 5.34 1.98 0 4.34 1.98 0 3.95 3.56 0 5.37
  [4,16,2.93,0,5.34,1.98,0,4.34,1.98,0,3.95,3.56,0,5.37],
// 4 16 1.98 0 4.34 1.94 0 4.24 1.93 0 4.15 1.98 0 3.95
  [4,16,1.98,0,4.34,1.94,0,4.24,1.93,0,4.15,1.98,0,3.95],
// 3 16 1.93 0 4.15 1.94 0 4.05 1.98 0 3.95
  [3,16,1.93,0,4.15,1.94,0,4.05,1.98,0,3.95],
// 4 16 1.98 0 3.95 3.59 0 2.29 3.61 0 5.37 3.56 0 5.37
  [4,16,1.98,0,3.95,3.59,0,2.29,3.61,0,5.37,3.56,0,5.37],
// 3 16 3.64 0 5.38 3.61 0 5.37 3.59 0 2.29
  [3,16,3.64,0,5.38,3.61,0,5.37,3.59,0,2.29],
// 3 16 -0.17 0 -1.25 -0.46 0 -2.7 0 0 -1.28
  [3,16,-0.17,0,-1.25,-0.46,0,-2.7,0,0,-1.28],
// 3 16 3.58 0 2.09 22.14 0 19.13 3.59 0 2.29
  [3,16,3.58,0,2.09,22.14,0,19.13,3.59,0,2.29],
// 3 16 0.47 0 -2.7 0.17 0 -1.25 0 0 -1.28
  [3,16,0.47,0,-2.7,0.17,0,-1.25,0,0,-1.28],
];
module ldraw_lib__26603p07(step=0, col=false, unit=2/5, alt=false, line=0.2, solid=!$preview)
    makepoly(ldraw_lib__26603p07(), step=step, col=col, unit=unit, alt=alt, line=line, solid=solid);
ldraw_lib__26603p07(line=0.2);
